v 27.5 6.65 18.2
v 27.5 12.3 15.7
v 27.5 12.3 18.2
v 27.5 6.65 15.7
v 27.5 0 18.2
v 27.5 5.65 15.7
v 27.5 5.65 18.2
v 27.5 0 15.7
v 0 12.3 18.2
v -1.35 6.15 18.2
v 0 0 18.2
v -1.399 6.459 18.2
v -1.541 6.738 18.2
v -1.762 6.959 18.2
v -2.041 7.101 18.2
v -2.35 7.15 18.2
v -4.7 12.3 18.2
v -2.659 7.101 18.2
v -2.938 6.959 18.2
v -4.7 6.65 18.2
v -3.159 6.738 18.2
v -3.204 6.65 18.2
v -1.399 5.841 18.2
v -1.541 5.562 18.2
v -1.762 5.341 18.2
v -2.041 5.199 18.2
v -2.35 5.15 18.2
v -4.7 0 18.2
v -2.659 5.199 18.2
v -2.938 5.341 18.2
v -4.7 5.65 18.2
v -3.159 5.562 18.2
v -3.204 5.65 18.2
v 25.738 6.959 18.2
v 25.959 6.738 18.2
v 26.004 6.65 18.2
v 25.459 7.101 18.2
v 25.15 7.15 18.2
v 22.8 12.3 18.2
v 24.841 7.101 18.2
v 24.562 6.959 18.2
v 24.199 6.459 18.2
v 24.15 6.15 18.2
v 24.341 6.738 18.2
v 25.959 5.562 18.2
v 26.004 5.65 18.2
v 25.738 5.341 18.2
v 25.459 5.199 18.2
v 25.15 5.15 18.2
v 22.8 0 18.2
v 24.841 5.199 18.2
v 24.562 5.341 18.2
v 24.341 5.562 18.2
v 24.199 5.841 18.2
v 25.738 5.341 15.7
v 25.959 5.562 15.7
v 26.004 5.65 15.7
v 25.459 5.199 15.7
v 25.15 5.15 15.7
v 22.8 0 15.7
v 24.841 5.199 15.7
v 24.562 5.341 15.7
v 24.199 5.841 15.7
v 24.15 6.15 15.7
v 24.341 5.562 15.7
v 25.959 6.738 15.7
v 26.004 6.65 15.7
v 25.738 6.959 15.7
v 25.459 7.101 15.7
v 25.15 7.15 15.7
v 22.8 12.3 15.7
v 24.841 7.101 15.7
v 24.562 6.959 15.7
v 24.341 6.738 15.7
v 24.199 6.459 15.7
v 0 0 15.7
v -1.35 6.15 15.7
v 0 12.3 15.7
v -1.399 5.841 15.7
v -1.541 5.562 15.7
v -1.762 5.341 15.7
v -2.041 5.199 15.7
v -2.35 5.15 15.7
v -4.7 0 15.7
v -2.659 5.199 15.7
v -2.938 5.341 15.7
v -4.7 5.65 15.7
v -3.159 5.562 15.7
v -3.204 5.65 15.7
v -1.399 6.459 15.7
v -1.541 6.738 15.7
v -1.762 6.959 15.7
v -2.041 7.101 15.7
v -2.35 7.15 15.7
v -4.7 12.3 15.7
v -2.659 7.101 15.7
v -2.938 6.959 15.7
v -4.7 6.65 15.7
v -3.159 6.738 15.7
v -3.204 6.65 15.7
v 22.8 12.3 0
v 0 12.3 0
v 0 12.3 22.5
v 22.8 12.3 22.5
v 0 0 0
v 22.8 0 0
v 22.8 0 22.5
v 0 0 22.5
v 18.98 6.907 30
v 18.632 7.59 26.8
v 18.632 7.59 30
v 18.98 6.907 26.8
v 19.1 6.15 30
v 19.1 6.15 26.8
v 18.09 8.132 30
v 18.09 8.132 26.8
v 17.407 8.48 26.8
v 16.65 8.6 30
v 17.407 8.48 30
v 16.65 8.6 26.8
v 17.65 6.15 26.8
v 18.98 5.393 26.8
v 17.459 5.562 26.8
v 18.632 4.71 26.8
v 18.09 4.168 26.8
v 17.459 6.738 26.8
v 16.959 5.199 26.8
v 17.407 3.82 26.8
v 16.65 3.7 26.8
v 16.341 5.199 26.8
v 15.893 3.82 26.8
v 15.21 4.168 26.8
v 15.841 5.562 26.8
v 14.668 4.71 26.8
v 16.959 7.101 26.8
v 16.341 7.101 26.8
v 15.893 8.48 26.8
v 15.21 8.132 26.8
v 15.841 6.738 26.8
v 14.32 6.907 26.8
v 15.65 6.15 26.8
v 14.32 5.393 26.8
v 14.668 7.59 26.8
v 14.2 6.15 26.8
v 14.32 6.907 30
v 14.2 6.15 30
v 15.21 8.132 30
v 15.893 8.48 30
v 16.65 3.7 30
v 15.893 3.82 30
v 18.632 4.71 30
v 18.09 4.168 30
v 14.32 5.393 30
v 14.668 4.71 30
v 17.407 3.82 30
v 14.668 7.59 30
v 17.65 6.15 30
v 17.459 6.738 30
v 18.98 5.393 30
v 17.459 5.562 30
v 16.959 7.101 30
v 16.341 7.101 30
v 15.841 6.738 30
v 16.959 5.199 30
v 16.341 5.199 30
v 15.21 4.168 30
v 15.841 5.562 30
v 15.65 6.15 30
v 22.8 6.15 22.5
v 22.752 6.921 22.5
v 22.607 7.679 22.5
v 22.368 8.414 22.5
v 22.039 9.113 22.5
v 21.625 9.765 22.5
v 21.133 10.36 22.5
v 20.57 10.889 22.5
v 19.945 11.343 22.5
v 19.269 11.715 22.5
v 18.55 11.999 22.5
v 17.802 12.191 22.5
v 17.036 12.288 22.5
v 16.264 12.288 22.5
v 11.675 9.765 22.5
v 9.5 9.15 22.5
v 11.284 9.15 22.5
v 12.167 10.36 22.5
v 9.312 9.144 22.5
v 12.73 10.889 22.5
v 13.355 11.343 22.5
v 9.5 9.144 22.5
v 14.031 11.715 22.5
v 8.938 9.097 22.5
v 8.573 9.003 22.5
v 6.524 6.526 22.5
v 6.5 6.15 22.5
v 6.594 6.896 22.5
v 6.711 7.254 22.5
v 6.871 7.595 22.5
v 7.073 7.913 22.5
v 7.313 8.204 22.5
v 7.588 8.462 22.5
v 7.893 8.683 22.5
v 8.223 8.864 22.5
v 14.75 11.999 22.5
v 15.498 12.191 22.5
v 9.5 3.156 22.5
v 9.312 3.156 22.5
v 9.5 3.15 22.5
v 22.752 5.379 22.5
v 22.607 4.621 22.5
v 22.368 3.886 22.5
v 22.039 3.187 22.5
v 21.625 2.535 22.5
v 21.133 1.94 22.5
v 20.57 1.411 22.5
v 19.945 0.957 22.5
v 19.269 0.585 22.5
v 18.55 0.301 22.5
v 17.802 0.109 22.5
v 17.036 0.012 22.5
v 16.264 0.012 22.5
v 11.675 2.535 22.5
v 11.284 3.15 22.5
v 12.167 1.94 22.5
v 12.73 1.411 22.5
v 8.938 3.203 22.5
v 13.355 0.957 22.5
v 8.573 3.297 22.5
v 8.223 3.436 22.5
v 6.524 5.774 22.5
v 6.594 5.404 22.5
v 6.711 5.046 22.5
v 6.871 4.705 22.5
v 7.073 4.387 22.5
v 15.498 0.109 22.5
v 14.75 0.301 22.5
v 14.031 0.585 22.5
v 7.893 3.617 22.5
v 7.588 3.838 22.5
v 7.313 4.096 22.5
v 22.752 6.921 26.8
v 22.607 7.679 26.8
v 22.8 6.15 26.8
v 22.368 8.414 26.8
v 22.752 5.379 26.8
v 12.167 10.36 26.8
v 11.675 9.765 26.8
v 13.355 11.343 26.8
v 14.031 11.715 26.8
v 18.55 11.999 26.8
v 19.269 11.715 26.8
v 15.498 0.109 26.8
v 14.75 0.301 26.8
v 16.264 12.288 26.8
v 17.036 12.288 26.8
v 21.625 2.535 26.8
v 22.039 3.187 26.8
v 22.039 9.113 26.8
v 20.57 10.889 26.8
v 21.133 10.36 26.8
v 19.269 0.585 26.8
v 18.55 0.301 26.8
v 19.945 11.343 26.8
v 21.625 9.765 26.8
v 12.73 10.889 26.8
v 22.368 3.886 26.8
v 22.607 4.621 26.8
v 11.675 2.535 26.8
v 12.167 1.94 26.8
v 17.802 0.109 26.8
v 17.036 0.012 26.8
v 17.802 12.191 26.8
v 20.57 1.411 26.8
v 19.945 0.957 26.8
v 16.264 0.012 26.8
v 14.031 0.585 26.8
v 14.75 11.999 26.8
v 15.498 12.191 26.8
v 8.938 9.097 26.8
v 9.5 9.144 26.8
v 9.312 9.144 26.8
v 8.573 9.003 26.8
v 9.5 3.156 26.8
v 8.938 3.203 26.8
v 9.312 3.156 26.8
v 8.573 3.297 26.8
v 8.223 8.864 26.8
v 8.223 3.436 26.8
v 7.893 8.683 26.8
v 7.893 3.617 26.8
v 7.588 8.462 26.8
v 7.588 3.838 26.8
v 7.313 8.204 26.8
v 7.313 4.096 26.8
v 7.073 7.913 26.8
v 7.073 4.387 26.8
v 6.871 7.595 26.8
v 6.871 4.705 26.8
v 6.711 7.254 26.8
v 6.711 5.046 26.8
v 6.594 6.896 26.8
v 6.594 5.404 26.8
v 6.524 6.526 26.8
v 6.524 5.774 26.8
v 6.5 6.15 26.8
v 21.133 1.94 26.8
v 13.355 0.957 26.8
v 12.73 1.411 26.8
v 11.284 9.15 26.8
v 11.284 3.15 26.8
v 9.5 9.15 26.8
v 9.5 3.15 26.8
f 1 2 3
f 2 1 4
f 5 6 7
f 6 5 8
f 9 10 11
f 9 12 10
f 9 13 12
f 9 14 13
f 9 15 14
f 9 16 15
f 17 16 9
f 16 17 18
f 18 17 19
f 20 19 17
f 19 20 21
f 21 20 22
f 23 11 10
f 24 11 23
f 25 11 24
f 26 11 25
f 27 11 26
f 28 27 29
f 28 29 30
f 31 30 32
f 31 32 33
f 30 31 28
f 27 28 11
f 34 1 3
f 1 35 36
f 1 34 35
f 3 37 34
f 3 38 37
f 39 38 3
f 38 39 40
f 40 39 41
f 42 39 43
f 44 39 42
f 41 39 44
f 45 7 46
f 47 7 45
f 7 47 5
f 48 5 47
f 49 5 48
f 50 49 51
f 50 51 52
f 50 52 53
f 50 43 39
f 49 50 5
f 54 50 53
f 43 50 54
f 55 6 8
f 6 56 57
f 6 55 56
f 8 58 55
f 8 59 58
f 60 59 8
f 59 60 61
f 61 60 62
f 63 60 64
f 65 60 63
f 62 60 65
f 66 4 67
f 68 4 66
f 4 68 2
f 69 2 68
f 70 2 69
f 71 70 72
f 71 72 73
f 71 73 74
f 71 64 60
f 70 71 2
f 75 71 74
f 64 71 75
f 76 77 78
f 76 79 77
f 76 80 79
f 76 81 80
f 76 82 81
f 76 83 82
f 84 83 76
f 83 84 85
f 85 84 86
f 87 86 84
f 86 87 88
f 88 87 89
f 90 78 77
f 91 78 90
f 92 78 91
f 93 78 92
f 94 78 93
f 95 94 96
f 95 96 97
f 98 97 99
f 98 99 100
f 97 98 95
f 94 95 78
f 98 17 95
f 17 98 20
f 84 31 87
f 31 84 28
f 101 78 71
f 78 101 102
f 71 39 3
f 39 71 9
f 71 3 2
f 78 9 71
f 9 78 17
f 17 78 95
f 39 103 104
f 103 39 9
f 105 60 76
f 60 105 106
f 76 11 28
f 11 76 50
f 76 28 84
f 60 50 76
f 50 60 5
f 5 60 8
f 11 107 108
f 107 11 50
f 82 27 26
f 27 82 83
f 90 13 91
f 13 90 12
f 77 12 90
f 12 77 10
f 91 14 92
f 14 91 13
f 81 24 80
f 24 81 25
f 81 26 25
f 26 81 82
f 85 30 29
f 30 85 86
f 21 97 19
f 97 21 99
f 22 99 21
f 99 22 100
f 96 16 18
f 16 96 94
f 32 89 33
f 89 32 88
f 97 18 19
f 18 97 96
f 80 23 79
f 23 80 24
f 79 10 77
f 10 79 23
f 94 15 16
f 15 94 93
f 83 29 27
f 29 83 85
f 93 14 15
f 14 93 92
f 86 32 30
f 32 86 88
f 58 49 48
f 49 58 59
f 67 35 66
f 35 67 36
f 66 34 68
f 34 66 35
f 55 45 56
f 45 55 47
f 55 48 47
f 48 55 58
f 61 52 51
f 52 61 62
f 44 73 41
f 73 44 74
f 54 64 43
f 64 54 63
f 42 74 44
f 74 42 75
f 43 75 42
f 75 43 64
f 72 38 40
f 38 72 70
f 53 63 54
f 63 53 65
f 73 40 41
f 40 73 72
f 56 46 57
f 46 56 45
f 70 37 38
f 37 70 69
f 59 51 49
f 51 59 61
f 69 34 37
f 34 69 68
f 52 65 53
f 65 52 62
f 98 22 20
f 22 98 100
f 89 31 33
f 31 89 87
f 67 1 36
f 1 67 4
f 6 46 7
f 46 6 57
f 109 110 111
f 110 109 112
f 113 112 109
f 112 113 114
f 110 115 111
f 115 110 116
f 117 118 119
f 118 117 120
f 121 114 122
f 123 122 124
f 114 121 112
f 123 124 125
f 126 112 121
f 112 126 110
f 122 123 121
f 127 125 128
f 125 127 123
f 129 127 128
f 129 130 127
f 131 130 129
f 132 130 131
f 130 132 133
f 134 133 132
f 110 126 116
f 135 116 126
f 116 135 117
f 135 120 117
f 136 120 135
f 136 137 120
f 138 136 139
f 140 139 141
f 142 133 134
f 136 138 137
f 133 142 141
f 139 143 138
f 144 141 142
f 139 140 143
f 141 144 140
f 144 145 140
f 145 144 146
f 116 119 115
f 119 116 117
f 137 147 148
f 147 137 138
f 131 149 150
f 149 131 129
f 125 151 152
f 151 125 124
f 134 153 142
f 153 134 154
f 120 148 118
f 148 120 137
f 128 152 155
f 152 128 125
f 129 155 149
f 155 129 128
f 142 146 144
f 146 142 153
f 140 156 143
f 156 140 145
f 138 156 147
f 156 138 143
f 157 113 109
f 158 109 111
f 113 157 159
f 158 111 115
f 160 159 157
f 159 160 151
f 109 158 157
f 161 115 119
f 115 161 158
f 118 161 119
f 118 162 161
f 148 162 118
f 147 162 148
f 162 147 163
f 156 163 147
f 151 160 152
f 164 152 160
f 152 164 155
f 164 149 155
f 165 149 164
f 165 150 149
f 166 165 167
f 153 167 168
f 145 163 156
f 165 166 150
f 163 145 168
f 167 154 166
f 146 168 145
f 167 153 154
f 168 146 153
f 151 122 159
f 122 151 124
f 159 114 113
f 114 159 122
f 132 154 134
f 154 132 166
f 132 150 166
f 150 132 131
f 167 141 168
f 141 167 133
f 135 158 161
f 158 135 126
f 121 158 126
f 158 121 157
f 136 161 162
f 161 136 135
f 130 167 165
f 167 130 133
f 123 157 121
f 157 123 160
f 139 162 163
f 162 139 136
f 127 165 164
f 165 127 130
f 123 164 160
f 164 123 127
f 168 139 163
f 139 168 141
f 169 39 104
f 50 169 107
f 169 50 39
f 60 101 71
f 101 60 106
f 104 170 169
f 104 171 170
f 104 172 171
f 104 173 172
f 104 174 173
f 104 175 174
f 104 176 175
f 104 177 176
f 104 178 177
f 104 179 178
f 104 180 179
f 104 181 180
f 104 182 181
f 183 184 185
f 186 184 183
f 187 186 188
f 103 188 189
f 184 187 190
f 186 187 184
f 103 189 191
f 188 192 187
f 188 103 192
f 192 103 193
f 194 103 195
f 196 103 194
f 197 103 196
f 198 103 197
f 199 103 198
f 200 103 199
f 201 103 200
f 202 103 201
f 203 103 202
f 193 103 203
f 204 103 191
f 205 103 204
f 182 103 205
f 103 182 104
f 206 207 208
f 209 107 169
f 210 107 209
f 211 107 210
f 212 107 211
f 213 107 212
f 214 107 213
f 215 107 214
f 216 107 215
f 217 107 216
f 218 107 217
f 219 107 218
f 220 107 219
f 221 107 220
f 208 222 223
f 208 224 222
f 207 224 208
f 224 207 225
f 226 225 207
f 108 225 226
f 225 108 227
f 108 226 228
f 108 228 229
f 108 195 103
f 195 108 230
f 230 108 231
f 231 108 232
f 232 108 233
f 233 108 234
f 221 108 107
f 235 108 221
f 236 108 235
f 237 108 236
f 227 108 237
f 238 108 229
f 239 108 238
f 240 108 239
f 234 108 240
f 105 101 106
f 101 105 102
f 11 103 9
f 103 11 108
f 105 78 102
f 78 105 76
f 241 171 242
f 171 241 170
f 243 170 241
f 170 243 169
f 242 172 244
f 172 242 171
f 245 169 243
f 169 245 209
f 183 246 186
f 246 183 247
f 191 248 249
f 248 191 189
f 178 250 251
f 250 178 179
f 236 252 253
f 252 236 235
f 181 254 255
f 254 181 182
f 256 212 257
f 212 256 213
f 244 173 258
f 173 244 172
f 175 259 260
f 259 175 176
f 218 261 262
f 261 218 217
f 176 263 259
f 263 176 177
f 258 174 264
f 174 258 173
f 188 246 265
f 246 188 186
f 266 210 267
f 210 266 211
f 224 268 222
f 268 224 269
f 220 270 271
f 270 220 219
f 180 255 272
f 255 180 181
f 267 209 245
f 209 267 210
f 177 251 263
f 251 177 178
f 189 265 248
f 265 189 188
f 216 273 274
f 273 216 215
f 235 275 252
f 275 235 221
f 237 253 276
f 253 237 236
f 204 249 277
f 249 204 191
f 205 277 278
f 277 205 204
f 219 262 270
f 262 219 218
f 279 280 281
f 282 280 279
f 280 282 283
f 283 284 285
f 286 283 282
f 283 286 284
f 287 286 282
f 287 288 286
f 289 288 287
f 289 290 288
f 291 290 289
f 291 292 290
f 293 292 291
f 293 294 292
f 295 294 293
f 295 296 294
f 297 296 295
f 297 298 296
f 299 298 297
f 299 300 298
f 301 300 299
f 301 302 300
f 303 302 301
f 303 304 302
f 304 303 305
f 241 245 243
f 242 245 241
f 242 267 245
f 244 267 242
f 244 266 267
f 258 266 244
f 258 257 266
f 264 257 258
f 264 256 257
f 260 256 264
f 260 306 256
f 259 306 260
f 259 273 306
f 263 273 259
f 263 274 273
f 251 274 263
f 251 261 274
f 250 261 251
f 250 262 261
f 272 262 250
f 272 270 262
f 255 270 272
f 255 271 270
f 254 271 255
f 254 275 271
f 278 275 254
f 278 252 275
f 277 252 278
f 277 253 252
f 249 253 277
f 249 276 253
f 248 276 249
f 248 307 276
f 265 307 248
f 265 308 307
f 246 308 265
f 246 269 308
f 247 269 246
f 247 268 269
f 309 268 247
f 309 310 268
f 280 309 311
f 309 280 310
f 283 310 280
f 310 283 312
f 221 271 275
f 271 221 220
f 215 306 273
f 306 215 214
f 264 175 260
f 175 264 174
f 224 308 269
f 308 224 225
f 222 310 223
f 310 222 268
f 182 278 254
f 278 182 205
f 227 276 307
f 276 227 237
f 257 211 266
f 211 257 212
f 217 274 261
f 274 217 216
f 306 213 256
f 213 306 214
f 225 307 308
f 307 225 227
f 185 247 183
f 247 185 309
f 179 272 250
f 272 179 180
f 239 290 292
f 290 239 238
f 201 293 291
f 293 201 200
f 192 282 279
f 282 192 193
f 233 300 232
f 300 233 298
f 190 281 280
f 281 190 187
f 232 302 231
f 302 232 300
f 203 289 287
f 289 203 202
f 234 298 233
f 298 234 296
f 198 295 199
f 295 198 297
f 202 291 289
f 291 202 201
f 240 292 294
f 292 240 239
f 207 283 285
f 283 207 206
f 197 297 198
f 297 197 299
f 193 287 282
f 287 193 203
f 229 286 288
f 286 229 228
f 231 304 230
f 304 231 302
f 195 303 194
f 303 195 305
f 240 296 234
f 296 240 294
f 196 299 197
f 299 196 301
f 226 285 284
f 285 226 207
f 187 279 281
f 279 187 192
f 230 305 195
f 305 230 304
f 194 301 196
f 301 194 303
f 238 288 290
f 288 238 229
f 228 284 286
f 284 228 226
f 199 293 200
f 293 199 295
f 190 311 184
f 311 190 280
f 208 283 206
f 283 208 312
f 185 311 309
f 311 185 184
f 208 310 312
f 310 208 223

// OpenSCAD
servo_l = 22.8;
servo_w = 12.3;
servo_total_h = 30;
servo_top_h = 22.5;
servo_flange_h = 18.2;
servo_flange_th = 2.5;
servo_l_with_flange = 32.2;
servo_flange_l = (servo_l_with_flange - servo_l) / 2;
servo_head_l = 3.2;
servo_head_d = 4.9;
servo_flange_hole_d = 2;
servo_flange_hole_dist = 27.5;
servo_edge_to_flange_hole = (servo_l_with_flange-servo_flange_hole_dist)/2;
servo_head_base_h = servo_total_h - servo_head_l;
servo_flange_hole_w=1;
servo_flange_hole_l=1.5;
servo_head_hole_d = 2;

servo_extra_bulge_d=6;  // measured
servo_extra_bulge_overlap=2;  // guesssed

maincolor="steelblue";

module sg90() {
    union() {
        color(maincolor) cube([servo_l,servo_w,servo_top_h]);
        color(maincolor) translate([-servo_flange_l,0,servo_flange_h-servo_flange_th])
            difference() {
                cube([servo_l_with_flange,servo_w,servo_flange_th]);
                translate([servo_edge_to_flange_hole,servo_w/2,-0.1])
                    cylinder(h=servo_flange_th+0.2,d=servo_flange_hole_d,$fn=20);
                translate([servo_l_with_flange-servo_edge_to_flange_hole,servo_w/2,-0.1])
                    cylinder(h=servo_flange_th+0.2,d=servo_flange_hole_d,$fn=20);
                translate([-0.1,servo_w/2-servo_flange_hole_w/2,-0.1])
                    cube([0.1+servo_flange_hole_l,servo_flange_hole_w,servo_flange_th + 0.2]);
                translate([servo_l_with_flange-servo_flange_hole_l,servo_w/2-servo_flange_hole_w/2,-0.1])
                    cube([0.1+servo_flange_hole_l,servo_flange_hole_w,servo_flange_th + 0.2]);
            }
        color(maincolor) translate([servo_l-servo_w/2,servo_w/2,servo_top_h])
            cylinder(d=servo_w,h=(servo_total_h-servo_top_h-servo_head_l),$fn=50);
        translate([servo_l-servo_w/2,servo_w/2,servo_total_h-servo_head_l])
            color("white") difference() {
                cylinder(d=servo_head_d,h=servo_head_l,$fn=20);
                cylinder(d=servo_head_hole_d,h=servo_head_l + 0.1, $fn=10);
            }
        color(maincolor) translate([servo_l-servo_w-servo_extra_bulge_d/2+servo_extra_bulge_overlap,servo_w/2,servo_top_h])
            cylinder(d=servo_extra_bulge_d,h=(servo_total_h-servo_top_h-servo_head_l),$fn=50);
        color(maincolor) translate([servo_l-servo_w-servo_extra_bulge_d/2+servo_extra_bulge_overlap,servo_w/2-servo_extra_bulge_d/2,servo_top_h])
            cube([servo_extra_bulge_d,servo_extra_bulge_d,(servo_total_h-servo_top_h-servo_head_l)]);
    }
}

sg90();
